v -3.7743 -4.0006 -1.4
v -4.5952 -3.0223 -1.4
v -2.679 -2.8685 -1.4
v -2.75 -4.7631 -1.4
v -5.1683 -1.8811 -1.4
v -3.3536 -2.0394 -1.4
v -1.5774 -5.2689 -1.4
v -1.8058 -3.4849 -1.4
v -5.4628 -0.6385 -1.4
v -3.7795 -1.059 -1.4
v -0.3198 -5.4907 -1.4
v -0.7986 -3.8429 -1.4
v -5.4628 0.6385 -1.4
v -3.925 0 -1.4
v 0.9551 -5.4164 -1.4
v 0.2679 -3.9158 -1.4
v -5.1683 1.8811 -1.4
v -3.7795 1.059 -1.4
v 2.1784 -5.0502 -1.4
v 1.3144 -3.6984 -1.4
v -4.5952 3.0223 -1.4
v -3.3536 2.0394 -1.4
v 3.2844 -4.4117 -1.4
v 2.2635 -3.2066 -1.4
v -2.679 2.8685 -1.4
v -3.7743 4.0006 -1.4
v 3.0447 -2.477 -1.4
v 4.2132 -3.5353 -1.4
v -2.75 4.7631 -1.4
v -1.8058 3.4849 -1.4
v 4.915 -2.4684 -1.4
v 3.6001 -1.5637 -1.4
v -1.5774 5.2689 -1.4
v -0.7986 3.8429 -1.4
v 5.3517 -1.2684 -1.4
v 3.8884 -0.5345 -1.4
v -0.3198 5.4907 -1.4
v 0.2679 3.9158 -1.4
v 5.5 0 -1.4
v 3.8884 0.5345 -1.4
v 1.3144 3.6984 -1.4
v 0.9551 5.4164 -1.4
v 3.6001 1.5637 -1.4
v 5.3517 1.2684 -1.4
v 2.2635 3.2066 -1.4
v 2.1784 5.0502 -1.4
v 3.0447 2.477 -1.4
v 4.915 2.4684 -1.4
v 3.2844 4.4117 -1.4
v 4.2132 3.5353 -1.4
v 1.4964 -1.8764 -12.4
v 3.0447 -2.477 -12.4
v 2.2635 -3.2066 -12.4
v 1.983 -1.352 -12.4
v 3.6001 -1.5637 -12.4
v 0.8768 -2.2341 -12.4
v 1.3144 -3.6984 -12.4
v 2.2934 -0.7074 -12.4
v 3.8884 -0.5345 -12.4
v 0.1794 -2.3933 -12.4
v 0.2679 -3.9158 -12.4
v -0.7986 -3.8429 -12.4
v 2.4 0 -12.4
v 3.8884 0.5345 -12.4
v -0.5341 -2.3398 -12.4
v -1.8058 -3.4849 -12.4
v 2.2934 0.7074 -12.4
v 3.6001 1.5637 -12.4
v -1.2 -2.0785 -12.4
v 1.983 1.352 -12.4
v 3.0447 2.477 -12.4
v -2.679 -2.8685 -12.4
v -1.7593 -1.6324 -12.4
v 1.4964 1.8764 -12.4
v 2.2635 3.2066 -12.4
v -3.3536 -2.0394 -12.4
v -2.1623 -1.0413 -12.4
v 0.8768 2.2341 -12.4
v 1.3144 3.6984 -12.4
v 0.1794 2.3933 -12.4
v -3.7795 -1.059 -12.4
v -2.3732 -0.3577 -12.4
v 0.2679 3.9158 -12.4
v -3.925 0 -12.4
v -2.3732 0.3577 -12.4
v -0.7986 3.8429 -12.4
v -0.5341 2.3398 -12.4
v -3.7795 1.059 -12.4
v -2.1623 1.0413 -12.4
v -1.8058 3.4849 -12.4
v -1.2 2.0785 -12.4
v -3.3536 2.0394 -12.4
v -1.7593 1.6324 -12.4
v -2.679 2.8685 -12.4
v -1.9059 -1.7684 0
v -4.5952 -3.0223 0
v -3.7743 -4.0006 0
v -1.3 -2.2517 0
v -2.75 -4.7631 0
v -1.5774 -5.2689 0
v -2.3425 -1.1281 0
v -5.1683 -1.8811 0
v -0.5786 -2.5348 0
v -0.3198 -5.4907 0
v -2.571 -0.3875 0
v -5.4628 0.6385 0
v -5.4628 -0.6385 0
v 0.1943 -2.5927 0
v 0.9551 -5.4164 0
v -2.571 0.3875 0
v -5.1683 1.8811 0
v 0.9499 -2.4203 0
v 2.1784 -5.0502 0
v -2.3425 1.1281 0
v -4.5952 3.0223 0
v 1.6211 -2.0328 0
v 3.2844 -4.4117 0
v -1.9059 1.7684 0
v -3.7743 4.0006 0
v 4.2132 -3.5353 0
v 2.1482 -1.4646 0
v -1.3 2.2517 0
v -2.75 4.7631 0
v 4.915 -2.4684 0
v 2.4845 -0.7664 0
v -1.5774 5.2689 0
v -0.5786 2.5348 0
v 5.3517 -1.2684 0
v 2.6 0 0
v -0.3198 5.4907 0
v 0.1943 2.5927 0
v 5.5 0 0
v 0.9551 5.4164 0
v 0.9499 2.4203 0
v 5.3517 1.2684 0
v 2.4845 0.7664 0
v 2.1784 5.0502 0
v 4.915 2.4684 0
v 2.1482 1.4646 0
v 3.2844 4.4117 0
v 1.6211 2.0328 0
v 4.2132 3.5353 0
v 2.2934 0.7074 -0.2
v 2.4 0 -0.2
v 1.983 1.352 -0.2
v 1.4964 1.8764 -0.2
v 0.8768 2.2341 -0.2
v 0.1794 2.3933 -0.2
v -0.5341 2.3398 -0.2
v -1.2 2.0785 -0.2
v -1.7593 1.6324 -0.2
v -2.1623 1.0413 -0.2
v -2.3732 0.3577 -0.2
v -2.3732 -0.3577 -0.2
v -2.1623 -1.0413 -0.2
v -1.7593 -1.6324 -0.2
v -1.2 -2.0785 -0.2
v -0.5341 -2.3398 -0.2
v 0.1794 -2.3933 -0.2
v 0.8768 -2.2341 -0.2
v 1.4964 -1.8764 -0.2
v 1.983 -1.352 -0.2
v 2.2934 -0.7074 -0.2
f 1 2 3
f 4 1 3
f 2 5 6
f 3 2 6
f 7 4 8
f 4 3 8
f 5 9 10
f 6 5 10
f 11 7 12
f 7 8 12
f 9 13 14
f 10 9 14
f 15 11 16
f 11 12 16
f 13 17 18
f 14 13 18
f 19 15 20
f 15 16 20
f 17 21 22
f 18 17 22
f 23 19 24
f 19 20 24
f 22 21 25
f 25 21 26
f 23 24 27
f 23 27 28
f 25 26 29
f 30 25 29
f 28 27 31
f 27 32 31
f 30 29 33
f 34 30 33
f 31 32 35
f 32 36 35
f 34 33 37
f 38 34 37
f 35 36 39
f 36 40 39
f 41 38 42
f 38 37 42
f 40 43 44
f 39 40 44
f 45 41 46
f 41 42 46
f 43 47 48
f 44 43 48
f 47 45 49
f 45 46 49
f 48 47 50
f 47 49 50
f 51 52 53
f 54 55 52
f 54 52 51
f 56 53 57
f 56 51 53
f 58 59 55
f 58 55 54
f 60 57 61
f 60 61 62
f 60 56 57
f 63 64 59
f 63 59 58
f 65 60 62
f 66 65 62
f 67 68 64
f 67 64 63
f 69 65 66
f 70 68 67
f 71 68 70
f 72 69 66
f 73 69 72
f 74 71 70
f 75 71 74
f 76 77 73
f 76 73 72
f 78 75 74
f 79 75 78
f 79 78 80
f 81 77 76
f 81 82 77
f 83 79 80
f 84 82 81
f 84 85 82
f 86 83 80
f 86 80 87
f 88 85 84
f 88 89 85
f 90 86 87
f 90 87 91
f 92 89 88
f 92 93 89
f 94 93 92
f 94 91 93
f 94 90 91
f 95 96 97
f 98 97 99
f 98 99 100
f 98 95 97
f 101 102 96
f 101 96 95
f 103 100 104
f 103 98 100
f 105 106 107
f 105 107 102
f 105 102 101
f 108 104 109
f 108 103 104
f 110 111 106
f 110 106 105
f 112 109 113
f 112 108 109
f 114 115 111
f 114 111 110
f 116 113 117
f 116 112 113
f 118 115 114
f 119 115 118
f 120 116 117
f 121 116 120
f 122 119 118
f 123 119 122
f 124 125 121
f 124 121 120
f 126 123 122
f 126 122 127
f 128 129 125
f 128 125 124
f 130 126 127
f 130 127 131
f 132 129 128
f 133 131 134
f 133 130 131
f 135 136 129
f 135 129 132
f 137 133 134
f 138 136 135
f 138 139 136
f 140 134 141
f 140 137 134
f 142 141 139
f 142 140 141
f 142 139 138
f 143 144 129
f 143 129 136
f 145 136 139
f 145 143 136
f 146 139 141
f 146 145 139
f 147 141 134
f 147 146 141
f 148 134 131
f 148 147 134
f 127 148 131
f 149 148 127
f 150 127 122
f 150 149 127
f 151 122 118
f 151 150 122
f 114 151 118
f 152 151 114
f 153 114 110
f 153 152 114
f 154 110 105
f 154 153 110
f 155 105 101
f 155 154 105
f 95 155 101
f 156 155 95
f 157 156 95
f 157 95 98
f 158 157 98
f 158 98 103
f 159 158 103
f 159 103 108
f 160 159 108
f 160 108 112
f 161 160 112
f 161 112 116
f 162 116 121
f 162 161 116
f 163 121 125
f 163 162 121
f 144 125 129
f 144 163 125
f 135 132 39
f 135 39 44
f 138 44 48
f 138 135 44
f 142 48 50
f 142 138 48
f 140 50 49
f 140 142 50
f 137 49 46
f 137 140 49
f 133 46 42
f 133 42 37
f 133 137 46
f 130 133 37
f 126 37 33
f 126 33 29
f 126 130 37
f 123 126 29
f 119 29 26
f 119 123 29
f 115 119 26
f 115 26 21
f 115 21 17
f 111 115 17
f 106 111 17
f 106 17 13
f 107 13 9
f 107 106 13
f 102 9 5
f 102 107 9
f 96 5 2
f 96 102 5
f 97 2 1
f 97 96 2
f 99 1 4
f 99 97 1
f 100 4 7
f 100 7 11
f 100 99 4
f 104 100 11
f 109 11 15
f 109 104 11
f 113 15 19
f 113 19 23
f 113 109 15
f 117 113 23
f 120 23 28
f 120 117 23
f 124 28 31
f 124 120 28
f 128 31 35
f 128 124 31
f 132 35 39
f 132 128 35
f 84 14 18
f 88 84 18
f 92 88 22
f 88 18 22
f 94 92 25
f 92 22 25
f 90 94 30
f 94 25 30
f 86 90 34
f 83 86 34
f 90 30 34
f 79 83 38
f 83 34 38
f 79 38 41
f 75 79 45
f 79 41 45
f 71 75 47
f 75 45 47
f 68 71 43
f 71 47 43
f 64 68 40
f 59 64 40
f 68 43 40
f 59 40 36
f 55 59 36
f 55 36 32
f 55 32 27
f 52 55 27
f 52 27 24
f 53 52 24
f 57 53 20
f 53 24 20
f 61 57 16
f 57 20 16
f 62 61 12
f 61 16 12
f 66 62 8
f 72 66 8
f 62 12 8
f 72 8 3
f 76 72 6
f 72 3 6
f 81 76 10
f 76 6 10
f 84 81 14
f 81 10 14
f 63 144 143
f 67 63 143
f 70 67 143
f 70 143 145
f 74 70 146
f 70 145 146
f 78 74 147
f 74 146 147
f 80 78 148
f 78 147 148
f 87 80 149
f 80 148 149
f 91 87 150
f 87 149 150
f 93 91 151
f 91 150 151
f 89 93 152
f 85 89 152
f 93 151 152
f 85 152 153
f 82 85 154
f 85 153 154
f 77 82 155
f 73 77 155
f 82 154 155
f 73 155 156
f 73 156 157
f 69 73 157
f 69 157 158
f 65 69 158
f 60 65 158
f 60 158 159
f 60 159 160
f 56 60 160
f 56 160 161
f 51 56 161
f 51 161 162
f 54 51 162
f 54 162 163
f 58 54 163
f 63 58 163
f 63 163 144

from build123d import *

# Parameters (mm, degrees)
SKETCH1_R          = 5.5
EXTRUDE1_DEPTH     = 1.4
SKETCH2_R          = 3.925
EXTRUDE2_DEPTH     = 11
SKETCH4_R          = 2.4
CUT_EXTRUDE1_DEPTH = 13.4
CHAMFER1_SIZE      = 0.2


with BuildPart() as part:
    # Sketch1 → Extrude1 (new body)
    with BuildSketch(Plane.XY):
        Circle(SKETCH1_R)
    extrude(amount=-EXTRUDE1_DEPTH)

    # Sketch2 → Extrude2 (add)
    with BuildSketch(Plane(origin=(0, 0, -1.4), x_dir=(-1, 0, 0), z_dir=(0, 0, -1))):
        Circle(SKETCH2_R)
    extrude(amount=EXTRUDE2_DEPTH)

    # Sketch4 → Cut-Extrude1 (cut, through all)
    with BuildSketch(Plane.XY):
        Circle(SKETCH4_R)
    extrude(amount=-CUT_EXTRUDE1_DEPTH, mode=Mode.SUBTRACT)

    # Chamfer1
    chamfer1_edges = [part.edges().sort_by_distance(p)[0] for p in [
        (-2.4, 0, 0),
    ]]
    chamfer(chamfer1_edges, length=CHAMFER1_SIZE)


solid = part.part
